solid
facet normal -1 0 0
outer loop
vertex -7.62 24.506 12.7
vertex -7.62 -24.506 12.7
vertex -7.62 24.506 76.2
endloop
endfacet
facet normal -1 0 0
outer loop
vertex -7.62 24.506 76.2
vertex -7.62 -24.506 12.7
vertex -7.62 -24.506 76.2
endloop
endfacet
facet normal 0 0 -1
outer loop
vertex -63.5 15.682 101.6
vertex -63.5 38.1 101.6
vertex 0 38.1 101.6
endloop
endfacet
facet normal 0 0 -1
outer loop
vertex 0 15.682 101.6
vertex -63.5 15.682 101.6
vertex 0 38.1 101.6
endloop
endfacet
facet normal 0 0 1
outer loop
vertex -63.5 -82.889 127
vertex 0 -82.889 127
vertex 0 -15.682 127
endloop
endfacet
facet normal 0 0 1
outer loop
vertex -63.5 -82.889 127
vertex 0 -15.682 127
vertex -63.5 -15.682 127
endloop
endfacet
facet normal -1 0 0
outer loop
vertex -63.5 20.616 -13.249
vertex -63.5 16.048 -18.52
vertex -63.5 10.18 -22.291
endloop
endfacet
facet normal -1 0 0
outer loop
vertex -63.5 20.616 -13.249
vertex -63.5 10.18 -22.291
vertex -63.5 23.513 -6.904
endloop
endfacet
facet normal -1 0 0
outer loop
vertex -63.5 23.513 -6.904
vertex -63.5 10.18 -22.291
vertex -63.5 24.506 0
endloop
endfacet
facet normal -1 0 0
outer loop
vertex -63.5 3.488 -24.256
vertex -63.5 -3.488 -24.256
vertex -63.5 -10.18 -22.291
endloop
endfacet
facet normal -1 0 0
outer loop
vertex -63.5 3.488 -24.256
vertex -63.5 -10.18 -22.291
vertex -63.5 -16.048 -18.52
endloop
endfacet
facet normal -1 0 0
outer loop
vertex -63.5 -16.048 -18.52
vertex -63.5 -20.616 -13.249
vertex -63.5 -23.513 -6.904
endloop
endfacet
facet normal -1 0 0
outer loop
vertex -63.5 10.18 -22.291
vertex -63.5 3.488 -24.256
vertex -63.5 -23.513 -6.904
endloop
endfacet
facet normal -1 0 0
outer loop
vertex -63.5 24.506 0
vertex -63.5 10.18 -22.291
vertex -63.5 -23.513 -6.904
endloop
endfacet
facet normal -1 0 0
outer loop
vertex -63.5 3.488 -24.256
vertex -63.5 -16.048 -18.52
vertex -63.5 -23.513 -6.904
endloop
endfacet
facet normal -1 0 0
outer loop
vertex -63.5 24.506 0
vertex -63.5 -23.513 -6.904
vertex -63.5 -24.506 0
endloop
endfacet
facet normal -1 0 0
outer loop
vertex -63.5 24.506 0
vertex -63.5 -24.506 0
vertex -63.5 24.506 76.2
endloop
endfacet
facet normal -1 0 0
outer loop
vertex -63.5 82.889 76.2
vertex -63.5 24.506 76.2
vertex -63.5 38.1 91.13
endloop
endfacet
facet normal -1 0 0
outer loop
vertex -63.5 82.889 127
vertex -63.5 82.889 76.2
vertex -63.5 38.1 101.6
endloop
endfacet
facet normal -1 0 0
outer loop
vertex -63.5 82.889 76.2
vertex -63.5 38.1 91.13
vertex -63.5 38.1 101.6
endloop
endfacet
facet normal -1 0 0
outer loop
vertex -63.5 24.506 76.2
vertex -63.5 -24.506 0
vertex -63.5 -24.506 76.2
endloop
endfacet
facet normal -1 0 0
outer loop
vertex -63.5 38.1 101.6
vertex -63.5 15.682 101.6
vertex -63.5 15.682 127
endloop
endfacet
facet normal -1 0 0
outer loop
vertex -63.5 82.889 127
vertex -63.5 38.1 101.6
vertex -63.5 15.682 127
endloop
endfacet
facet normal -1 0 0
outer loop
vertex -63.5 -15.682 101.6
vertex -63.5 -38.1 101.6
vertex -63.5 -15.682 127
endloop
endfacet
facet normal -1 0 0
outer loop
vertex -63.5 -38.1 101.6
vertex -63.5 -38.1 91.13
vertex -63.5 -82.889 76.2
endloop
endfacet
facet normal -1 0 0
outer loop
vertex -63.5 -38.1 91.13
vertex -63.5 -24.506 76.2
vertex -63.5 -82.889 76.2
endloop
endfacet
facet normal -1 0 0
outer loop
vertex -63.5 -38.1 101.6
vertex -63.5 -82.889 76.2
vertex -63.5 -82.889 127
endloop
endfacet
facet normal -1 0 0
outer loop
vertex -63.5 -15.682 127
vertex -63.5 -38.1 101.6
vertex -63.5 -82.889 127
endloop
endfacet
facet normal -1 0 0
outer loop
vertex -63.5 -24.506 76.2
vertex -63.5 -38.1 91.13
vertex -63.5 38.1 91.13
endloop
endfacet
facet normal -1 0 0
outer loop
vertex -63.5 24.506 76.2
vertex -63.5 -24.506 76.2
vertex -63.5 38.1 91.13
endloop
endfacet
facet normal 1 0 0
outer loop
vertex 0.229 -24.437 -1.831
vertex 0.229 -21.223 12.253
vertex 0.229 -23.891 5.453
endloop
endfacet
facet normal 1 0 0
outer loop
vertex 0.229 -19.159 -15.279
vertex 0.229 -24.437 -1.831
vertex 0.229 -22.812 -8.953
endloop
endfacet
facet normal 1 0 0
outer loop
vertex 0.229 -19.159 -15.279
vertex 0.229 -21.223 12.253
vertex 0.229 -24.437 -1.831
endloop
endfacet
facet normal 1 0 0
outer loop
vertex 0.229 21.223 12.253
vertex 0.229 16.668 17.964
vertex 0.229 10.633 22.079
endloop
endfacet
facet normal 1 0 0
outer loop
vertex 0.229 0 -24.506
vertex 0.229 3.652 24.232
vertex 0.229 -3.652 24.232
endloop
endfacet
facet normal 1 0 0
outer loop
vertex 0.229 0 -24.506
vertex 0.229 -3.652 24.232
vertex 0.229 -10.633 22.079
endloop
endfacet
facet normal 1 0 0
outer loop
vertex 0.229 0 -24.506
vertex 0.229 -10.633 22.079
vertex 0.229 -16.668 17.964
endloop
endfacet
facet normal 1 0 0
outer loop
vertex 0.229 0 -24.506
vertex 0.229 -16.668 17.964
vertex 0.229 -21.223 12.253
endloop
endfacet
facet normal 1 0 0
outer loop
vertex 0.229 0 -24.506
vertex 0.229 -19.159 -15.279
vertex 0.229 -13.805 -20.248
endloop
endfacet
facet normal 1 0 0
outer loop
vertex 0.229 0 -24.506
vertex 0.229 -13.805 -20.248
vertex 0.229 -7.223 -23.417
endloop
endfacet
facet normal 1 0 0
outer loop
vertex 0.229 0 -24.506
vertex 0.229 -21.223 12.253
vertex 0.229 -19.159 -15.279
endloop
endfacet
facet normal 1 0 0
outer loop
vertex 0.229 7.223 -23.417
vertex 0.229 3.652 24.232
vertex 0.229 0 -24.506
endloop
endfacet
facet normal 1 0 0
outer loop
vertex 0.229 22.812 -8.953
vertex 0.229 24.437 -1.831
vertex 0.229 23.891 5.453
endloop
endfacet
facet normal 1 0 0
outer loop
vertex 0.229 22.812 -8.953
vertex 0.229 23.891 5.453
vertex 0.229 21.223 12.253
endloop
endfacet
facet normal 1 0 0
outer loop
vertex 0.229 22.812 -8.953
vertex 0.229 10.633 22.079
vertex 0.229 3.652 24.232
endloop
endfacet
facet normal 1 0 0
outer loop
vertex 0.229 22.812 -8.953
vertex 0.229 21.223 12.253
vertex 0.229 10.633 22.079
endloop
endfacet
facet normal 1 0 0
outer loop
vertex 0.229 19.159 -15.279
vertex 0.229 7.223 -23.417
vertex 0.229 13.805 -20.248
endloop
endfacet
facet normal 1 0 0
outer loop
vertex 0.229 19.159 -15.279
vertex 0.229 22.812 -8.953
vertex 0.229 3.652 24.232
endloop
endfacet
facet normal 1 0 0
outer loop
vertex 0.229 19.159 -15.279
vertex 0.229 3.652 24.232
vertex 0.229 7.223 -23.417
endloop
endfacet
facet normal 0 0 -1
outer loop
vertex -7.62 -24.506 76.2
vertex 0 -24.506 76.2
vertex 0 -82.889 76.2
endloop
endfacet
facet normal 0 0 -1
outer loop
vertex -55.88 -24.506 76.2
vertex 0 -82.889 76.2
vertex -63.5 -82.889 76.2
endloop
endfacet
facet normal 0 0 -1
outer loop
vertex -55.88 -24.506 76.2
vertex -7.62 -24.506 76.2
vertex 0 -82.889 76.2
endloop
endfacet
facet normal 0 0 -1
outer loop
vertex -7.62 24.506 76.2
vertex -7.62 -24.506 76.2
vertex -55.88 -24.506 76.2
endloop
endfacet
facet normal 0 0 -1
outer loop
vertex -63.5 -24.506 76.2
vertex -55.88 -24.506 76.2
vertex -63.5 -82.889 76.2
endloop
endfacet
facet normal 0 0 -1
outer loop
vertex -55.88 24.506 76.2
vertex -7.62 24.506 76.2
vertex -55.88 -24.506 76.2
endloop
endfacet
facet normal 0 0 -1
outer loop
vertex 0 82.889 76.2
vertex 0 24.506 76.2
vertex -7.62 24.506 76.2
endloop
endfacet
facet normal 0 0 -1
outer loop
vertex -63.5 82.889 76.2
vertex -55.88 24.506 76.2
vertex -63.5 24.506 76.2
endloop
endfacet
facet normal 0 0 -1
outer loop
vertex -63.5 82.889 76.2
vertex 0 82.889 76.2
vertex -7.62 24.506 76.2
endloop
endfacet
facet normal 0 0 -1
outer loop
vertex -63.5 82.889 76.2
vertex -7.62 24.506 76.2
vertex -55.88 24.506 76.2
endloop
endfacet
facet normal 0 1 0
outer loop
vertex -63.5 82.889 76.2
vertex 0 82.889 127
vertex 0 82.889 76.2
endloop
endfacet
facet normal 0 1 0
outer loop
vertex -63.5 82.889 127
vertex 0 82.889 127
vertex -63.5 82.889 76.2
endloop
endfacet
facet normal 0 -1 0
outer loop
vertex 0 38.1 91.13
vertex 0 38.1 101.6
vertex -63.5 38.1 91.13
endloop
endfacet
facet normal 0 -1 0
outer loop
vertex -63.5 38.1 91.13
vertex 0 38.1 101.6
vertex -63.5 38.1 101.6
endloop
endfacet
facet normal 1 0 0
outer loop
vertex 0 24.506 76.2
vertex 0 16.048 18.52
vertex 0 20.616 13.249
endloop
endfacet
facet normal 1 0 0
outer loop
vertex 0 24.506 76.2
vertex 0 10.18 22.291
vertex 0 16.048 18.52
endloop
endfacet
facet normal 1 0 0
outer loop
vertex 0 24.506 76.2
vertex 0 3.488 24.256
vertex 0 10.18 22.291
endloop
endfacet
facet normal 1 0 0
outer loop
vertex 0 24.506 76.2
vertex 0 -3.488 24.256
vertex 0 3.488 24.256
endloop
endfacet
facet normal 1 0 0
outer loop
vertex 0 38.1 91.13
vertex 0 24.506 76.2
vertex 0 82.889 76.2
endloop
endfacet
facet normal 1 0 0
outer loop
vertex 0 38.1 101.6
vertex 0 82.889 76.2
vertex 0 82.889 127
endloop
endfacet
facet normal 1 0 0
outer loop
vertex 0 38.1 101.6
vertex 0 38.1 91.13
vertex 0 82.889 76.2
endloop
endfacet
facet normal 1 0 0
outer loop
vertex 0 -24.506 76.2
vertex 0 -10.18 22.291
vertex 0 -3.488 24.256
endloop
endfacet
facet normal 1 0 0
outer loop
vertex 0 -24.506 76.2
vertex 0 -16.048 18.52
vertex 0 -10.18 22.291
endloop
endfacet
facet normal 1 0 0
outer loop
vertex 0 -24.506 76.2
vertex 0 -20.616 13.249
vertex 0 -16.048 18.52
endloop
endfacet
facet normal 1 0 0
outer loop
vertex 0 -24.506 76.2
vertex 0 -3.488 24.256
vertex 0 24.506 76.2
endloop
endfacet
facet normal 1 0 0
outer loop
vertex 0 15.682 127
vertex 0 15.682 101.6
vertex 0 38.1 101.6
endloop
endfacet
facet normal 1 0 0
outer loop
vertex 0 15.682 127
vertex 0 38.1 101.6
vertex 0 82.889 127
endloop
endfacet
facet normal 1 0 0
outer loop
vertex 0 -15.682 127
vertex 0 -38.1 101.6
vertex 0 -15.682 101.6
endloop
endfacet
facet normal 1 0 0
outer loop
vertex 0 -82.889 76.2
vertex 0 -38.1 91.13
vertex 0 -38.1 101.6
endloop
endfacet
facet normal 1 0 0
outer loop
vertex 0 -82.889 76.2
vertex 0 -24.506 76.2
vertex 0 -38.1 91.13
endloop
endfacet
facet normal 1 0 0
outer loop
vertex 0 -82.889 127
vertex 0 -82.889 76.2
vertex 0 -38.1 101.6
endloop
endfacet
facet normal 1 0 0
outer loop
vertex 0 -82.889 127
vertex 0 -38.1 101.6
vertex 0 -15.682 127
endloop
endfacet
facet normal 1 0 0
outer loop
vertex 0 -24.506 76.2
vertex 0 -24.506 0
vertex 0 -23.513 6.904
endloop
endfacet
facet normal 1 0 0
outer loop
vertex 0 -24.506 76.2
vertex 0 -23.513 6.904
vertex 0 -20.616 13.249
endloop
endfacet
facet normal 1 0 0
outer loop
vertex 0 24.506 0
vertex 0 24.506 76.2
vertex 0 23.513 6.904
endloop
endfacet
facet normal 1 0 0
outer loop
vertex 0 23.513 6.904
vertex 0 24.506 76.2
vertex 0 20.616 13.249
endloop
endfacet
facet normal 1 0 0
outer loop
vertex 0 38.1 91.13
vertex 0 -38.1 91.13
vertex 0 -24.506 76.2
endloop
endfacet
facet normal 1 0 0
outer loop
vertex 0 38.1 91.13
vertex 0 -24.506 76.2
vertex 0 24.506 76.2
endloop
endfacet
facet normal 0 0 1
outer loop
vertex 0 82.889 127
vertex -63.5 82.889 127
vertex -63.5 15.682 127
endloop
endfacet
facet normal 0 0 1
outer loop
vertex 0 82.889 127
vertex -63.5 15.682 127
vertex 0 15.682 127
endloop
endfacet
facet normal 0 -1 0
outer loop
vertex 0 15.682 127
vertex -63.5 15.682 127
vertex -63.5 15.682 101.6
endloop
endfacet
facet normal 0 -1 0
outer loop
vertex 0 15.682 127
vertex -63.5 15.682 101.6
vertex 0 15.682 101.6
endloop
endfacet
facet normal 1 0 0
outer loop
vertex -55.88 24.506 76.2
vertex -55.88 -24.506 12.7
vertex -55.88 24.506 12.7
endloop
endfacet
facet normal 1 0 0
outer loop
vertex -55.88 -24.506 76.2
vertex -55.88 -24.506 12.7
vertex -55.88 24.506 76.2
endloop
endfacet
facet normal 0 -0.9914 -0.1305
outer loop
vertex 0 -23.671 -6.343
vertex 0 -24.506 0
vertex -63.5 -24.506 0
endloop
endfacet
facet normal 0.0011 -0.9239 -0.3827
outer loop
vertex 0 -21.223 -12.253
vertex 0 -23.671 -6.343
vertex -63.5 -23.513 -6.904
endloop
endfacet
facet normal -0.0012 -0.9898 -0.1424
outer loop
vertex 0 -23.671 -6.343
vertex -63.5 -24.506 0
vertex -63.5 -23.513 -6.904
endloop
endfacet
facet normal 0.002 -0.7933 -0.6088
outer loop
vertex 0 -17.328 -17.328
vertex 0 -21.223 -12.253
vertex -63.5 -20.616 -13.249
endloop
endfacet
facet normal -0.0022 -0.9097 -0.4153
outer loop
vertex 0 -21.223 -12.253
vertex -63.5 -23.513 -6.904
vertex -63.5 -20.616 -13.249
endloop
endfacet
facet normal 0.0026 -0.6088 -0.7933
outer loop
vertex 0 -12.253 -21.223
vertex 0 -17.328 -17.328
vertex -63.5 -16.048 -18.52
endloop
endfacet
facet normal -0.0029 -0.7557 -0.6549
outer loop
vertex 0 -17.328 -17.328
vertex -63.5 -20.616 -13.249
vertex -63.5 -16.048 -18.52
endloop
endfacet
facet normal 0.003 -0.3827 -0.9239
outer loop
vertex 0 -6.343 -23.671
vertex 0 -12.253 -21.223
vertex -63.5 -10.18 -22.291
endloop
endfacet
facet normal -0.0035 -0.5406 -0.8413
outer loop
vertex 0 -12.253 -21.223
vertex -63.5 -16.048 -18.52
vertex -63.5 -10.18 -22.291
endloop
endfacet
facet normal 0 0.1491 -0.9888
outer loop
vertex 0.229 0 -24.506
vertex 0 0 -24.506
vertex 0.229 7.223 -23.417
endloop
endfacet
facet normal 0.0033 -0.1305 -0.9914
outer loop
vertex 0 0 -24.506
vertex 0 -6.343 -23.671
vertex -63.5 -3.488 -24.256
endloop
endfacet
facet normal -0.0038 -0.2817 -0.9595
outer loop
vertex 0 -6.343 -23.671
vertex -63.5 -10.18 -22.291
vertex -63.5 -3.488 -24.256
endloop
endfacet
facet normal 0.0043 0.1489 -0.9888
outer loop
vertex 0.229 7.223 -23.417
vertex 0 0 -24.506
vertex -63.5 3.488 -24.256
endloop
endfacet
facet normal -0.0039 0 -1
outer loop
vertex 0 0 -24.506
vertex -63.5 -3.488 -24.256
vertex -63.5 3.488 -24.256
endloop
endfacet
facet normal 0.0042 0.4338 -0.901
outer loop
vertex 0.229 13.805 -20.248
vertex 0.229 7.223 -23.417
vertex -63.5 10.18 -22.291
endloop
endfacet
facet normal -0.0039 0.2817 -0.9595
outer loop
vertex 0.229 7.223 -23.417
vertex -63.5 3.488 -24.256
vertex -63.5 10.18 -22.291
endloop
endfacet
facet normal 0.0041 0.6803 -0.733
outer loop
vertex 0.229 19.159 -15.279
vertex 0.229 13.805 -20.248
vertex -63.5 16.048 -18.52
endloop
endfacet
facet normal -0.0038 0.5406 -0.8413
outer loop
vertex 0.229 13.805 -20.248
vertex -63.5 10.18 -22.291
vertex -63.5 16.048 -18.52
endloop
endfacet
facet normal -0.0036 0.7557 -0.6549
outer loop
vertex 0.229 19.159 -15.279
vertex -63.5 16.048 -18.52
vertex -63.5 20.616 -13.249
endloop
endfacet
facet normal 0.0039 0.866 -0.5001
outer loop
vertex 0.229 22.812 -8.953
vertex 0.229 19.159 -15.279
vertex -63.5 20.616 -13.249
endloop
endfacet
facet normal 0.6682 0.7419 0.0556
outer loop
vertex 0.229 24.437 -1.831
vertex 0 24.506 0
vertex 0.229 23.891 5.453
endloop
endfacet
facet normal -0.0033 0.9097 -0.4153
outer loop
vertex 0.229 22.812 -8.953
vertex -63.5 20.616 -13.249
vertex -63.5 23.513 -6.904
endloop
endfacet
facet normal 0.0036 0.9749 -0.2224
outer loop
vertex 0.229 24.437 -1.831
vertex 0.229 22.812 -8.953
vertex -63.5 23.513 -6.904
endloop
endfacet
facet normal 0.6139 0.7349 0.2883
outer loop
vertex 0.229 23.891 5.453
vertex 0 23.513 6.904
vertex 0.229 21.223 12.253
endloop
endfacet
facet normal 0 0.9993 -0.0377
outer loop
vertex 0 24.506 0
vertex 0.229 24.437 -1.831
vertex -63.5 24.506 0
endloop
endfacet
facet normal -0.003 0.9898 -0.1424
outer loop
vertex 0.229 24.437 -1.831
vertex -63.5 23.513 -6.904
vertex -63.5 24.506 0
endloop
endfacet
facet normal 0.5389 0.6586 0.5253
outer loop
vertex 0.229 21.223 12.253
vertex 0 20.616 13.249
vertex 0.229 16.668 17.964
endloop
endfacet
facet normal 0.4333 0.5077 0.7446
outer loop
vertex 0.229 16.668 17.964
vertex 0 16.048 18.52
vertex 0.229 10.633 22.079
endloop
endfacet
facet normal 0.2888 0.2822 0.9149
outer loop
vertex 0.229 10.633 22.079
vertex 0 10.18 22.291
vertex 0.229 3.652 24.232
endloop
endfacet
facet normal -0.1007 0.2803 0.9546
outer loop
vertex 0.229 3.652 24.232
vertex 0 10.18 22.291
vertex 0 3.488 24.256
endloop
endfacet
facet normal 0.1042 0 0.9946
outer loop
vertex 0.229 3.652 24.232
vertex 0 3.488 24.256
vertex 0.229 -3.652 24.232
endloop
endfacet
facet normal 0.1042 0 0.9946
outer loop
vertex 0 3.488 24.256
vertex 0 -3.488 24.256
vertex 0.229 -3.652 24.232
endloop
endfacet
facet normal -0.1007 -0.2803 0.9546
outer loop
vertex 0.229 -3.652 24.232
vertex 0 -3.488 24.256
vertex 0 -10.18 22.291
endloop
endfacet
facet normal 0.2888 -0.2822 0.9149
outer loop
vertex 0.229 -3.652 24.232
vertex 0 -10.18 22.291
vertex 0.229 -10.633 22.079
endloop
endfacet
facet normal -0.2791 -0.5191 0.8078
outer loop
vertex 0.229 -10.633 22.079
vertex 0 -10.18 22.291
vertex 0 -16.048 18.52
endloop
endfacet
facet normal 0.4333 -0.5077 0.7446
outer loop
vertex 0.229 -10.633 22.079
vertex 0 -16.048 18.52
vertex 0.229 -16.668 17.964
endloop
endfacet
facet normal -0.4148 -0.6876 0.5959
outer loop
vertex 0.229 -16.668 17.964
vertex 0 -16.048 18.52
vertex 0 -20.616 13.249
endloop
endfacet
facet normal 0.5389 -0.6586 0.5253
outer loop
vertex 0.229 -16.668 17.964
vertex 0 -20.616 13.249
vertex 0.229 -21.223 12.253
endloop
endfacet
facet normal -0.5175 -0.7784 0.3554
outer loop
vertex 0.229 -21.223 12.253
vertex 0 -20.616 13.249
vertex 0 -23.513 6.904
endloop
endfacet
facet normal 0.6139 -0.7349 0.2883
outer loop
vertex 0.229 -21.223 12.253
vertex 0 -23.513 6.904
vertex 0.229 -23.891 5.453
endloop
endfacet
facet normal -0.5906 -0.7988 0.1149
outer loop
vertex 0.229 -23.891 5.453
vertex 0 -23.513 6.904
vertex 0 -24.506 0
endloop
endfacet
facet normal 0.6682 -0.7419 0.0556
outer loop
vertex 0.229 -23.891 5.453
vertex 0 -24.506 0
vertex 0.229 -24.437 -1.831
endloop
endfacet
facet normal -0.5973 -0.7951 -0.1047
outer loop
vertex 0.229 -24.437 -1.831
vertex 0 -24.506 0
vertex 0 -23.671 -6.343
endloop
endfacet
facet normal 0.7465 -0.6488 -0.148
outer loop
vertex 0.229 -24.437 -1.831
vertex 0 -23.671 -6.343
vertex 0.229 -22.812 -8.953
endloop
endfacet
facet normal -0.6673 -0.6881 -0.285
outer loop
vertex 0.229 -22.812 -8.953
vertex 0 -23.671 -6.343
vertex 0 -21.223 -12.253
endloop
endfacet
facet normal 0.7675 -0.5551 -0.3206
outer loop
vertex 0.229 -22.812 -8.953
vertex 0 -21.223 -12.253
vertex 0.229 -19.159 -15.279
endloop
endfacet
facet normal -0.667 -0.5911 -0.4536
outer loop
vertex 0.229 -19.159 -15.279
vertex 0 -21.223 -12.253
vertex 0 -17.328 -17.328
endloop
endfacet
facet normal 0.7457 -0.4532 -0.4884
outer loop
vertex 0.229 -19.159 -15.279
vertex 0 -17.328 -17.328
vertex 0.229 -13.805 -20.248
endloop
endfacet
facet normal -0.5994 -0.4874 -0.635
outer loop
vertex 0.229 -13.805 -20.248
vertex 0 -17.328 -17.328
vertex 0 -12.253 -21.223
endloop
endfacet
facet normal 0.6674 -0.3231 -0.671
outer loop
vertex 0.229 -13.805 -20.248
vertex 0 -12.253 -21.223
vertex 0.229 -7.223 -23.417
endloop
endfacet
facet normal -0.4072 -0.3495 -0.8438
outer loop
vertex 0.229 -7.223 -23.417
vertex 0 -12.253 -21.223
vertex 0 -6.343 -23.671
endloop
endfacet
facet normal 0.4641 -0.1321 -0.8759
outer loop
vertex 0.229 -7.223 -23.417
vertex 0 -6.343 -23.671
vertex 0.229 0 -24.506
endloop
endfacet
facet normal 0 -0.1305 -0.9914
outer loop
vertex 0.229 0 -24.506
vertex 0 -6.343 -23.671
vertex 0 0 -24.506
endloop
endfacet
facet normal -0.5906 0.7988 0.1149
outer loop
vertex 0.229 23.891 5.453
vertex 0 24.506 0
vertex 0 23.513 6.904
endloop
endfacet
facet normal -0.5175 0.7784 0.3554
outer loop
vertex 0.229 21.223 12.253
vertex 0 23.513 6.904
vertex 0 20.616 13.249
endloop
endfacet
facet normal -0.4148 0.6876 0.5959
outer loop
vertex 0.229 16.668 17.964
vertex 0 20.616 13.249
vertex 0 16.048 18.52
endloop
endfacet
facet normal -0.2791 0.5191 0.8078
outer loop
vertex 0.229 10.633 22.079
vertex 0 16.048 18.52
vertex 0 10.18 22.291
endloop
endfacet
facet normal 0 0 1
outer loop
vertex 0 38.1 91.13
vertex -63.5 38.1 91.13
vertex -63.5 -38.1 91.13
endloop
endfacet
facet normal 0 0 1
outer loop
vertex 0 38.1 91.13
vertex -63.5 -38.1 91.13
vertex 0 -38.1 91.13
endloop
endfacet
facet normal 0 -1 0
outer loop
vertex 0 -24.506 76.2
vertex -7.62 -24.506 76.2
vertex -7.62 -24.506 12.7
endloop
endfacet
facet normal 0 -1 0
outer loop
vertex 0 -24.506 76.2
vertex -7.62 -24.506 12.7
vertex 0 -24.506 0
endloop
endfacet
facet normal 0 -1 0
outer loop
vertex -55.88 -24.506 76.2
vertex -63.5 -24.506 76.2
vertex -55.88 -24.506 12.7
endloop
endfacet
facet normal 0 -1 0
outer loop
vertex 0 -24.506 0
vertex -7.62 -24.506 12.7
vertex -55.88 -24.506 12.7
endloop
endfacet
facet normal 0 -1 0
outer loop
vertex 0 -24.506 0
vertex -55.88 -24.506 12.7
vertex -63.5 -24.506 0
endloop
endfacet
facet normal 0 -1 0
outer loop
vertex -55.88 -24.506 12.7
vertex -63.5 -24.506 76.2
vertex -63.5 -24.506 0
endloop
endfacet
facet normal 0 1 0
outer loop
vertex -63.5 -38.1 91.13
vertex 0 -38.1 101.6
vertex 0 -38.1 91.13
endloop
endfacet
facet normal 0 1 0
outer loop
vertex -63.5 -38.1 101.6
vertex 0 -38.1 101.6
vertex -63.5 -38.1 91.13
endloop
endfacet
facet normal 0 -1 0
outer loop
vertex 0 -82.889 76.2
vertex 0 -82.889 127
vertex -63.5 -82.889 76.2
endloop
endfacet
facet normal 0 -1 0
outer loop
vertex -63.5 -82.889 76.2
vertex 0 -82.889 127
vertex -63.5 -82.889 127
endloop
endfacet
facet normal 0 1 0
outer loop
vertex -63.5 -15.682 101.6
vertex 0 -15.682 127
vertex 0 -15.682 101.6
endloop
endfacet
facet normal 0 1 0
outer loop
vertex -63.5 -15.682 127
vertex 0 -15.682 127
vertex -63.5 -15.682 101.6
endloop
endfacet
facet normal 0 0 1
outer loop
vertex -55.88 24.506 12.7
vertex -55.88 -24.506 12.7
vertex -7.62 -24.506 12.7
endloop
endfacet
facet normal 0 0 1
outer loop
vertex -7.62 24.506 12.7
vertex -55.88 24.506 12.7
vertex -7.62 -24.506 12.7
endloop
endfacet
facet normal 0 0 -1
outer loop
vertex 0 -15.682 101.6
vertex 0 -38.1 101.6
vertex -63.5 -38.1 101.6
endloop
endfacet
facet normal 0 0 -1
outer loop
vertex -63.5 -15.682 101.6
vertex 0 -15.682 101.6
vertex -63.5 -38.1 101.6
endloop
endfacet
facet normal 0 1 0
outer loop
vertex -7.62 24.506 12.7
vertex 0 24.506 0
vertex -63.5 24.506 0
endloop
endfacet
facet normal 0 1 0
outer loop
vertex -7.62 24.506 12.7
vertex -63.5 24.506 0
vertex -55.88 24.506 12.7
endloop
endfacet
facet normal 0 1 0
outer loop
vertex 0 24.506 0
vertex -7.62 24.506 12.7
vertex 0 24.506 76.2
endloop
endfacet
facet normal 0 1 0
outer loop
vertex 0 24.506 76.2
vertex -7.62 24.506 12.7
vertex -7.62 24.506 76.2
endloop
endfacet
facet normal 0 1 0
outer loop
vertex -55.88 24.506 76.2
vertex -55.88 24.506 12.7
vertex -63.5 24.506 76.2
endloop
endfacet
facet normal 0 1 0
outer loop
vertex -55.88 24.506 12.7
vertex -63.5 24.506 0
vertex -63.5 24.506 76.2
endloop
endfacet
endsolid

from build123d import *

# Parameters (mm, degrees)
SKETCH1_R           = 24.505905818
BOSS_EXTRUDE1_DEPTH = 0.2286
BOSS_EXTRUDE2_START = 63.5
BOSS_EXTRUDE2_DEPTH = 63.5
SKETCH4_W           = 63.5
SKETCH4_H           = 76.2
BOSS_EXTRUDE4_DEPTH = 14.929782549
SKETCH5_W           = 63.5
SKETCH5_H           = 50.8
BOSS_EXTRUDE5_DEPTH = 44.789347647
SKETCH7_W           = 63.5
SKETCH7_H           = 25.4
BOSS_EXTRUDE7_DEPTH = 22.41804
SKETCH8_W           = 63.5
SKETCH8_H           = 25.4
BOSS_EXTRUDE8_DEPTH = 22.41804
SKETCH9_W           = 48.26
SKETCH9_H           = 63.5
CUT_EXTRUDE1_DEPTH  = 179.030869421


with BuildPart() as part:
    # Sketch1 → Boss-Extrude1 (new body)
    with BuildSketch(Plane.YZ):
        Circle(SKETCH1_R)
    extrude(amount=BOSS_EXTRUDE1_DEPTH)

    # Sketch2 → Boss-Extrude2 (add)
    with BuildSketch(Plane(origin=(0, 0, 0), x_dir=(0, -1, 0), z_dir=(-1, 0, 0)).offset(BOSS_EXTRUDE2_START)):
        with BuildLine():
            Line((-24.505905818, 0), (-24.505905818, 76.2))
            Line((-24.505905818, 76.2), (24.505905818, 76.2))
            Line((24.505905818, 76.2), (24.505905818, 0))
            ThreePointArc((24.505905818, 0), (0, -24.505905818), (-24.505905818, 0))
        make_face()
    extrude(amount=-BOSS_EXTRUDE2_DEPTH)

    # Sketch4 → Boss-Extrude4 (add)
    with BuildSketch(Plane.XY.offset(76.2)):
        with Locations((-31.75, 0)):
            Rectangle(SKETCH4_W, SKETCH4_H)
    extrude(amount=BOSS_EXTRUDE4_DEPTH)

    # Sketch5 → Boss-Extrude5 (add)
    with BuildSketch(Plane(origin=(0, 38.1, 0), x_dir=(-1, 0, 0), z_dir=(0, 1, 0))):
        with Locations((31.75, 101.6)):
            Rectangle(SKETCH5_W, SKETCH5_H)
    boss_extrude5 = extrude(amount=BOSS_EXTRUDE5_DEPTH)

    # Mirror1: Boss-Extrude5 across plane
    add(boss_extrude5.mirror(Plane.ZX))

    # Sketch7 → Boss-Extrude7 (add)
    with BuildSketch(Plane.XZ.offset(-38.1)):
        with Locations((-31.75, 114.3)):
            Rectangle(SKETCH7_W, SKETCH7_H)
    extrude(amount=BOSS_EXTRUDE7_DEPTH)

    # Sketch8 → Boss-Extrude8 (add)
    with BuildSketch(Plane(origin=(0, -38.1, 0), x_dir=(-1, 0, 0), z_dir=(0, 1, 0))):
        with Locations((31.75, 114.3)):
            Rectangle(SKETCH8_W, SKETCH8_H)
    extrude(amount=BOSS_EXTRUDE8_DEPTH)

    # Sketch9 → Cut-Extrude1 (cut, through all)
    with BuildSketch(Plane.XZ.offset(24.505905818)):
        with Locations((-31.75, 44.45)):
            Rectangle(SKETCH9_W, SKETCH9_H)
    extrude(amount=-CUT_EXTRUDE1_DEPTH, mode=Mode.SUBTRACT)


solid = part.part
